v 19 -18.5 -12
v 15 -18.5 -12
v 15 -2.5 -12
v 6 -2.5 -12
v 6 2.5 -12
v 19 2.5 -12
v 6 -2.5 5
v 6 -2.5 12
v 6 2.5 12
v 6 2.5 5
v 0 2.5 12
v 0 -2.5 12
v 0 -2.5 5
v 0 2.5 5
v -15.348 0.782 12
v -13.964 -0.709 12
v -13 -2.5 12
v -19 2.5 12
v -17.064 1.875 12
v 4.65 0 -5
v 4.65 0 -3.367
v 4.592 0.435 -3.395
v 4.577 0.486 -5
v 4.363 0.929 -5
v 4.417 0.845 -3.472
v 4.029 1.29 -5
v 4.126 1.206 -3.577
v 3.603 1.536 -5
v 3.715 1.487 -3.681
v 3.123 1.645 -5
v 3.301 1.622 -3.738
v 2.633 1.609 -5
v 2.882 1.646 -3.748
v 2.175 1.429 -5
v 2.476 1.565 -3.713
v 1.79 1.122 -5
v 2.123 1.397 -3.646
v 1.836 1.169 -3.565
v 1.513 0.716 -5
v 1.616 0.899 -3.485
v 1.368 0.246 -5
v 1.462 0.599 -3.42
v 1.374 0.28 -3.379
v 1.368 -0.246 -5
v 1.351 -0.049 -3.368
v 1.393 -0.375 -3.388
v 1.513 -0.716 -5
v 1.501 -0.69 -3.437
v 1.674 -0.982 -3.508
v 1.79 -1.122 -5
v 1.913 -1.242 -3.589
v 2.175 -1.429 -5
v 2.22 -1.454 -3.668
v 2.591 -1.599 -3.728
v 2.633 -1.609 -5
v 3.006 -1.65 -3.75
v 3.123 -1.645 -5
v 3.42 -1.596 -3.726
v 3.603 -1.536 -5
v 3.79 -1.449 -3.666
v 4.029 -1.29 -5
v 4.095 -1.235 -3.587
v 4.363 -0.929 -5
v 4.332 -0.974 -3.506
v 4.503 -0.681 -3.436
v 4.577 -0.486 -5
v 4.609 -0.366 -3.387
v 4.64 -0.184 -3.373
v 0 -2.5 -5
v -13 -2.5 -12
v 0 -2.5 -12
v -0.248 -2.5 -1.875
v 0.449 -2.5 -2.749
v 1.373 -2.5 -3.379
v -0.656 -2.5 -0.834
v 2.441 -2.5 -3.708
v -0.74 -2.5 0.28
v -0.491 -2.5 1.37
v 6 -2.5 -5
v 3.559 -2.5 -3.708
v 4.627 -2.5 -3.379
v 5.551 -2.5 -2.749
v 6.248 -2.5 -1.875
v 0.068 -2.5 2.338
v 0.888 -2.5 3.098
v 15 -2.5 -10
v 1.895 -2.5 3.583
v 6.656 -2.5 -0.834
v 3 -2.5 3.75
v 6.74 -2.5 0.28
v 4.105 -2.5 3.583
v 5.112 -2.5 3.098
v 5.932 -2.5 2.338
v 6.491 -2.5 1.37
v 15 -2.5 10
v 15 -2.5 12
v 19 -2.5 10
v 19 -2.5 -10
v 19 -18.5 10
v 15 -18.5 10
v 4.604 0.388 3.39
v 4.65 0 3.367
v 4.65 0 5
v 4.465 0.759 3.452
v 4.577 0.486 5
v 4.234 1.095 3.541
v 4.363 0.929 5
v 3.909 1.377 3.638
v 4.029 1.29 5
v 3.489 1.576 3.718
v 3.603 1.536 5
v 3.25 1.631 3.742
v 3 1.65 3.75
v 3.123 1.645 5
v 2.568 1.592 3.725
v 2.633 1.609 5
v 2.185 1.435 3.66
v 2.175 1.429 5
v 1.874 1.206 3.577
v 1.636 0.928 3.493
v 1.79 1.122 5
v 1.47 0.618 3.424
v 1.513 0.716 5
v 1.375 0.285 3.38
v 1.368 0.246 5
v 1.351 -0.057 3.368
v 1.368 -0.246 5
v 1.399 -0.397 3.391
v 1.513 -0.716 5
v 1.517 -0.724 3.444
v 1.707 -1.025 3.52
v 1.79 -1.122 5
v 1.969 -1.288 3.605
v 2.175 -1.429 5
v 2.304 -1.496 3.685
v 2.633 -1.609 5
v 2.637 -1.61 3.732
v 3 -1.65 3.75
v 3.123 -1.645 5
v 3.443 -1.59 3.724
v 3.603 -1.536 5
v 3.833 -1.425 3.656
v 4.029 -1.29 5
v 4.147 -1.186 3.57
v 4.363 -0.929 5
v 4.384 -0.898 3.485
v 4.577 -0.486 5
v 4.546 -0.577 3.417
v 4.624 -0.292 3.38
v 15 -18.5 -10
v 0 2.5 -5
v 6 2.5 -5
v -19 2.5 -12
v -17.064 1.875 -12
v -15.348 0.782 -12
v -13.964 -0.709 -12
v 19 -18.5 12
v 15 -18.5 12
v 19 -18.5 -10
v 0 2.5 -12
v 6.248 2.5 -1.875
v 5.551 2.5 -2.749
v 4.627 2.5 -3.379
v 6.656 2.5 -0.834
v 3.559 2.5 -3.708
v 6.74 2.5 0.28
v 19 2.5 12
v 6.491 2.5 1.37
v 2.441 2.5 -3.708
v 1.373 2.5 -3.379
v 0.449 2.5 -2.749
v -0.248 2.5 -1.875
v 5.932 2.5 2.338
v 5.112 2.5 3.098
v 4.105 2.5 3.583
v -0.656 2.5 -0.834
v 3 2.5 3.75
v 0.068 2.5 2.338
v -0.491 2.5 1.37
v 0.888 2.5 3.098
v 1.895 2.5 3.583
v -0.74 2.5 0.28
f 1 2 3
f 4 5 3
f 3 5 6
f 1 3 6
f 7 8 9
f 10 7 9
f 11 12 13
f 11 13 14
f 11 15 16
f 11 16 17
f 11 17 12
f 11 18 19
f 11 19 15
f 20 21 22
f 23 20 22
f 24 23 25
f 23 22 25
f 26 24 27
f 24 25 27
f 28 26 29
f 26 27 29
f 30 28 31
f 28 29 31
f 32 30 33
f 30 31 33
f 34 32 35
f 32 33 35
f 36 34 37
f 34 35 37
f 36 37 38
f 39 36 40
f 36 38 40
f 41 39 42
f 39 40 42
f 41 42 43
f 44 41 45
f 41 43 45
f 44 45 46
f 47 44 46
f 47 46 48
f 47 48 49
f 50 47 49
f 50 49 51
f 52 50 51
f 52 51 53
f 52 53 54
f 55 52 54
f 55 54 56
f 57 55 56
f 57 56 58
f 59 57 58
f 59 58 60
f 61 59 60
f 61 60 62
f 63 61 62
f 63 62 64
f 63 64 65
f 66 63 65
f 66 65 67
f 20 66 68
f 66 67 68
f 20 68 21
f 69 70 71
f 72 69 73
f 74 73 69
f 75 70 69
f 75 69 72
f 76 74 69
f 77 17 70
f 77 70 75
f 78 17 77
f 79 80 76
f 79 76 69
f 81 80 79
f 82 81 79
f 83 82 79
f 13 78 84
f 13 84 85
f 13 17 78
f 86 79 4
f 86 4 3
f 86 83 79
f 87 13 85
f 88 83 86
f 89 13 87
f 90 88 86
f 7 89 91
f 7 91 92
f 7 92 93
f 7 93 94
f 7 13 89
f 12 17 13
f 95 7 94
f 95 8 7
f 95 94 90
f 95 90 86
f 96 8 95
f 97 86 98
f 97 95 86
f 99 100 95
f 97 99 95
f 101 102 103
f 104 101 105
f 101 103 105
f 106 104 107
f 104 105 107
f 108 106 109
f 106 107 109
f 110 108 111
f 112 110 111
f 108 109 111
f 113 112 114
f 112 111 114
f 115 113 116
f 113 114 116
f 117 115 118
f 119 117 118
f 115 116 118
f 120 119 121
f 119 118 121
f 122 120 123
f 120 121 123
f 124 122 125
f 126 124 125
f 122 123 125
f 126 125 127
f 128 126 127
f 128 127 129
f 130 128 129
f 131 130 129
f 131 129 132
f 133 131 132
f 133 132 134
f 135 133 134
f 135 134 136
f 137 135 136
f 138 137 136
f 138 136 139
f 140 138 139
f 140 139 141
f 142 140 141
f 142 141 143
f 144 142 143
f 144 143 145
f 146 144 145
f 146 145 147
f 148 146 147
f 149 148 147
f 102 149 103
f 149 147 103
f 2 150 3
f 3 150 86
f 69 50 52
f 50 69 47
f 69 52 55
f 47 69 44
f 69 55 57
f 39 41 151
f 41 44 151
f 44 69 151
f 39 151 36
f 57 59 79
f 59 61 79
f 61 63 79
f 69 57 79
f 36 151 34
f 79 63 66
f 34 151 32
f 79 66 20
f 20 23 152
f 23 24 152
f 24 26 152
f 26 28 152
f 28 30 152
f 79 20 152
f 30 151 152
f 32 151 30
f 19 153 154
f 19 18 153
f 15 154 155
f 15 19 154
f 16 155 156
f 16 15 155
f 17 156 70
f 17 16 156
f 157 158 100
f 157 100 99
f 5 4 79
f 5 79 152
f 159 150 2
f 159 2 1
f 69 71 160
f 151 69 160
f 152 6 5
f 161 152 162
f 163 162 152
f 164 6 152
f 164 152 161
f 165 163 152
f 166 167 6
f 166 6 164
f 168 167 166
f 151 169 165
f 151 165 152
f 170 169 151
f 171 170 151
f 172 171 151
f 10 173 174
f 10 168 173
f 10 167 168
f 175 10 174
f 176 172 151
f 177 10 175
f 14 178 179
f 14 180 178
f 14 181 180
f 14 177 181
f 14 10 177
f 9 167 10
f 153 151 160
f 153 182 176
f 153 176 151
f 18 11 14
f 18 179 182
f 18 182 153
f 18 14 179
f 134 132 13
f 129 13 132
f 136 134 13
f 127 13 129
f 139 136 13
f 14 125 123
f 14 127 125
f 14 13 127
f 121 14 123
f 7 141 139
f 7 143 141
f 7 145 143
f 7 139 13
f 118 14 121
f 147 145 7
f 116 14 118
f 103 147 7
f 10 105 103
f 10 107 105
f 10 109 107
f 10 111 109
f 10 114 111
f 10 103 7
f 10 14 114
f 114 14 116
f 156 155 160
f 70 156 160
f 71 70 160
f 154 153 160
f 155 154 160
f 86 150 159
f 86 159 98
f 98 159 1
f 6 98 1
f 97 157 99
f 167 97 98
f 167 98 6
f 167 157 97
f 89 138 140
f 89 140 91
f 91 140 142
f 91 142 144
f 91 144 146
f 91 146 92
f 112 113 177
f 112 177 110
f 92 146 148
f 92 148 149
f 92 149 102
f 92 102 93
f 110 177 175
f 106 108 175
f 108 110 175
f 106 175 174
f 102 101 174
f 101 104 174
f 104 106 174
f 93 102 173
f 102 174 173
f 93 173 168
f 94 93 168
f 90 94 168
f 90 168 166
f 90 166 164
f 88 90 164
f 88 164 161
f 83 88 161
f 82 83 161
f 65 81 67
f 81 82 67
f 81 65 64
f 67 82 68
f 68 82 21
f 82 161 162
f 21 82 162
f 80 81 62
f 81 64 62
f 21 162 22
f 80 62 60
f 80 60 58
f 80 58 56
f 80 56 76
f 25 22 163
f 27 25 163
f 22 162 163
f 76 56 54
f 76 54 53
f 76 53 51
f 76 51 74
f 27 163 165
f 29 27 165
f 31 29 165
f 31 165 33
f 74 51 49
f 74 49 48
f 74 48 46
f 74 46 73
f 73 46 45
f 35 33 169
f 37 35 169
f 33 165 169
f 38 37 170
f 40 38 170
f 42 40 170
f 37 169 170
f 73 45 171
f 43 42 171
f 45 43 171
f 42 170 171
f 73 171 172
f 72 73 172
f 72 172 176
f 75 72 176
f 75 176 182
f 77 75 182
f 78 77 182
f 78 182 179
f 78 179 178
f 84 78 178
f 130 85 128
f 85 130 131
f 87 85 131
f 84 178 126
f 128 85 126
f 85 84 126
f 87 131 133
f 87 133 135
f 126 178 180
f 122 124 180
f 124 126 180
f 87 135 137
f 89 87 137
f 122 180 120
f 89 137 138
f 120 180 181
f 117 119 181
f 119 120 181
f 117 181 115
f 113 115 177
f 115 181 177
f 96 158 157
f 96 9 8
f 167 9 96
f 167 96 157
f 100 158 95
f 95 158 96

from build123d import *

# Parameters (mm, degrees)
BOSS_EXTRUDE1_DEPTH = 12
CUT_EXTRUDE1_REACH  = 32.712
SKETCH4_R           = 1.65
SKETCH4_3_W         = 6
SKETCH4_3_H         = 5
SKETCH4_3_R         = 1.65
CUT_EXTRUDE3_DEPTH  = 7
CUT_EXTRUDE2_REACH  = 25.022
SKETCH5_R           = 3.75
SKETCH6_W           = 4
SKETCH6_H           = 16
BOSS_EXTRUDE2_DEPTH = 24
CUT_EXTRUDE4_REACH  = 42.525
SKETCH7_W           = 20
SKETCH7_H           = 16


with BuildPart() as part:
    # Sketch3 → Boss-Extrude1 (new, symmetric)
    with BuildSketch(Plane.XY):
        with BuildLine():
            Line((-13, -2.5), (19, -2.5))
            Line((19, -2.5), (19, 2.5))
            Line((19, 2.5), (-19, 2.5))
            ThreePointArc((-19, 2.5), (-15.348369117, 0.781957059), (-13, -2.5))
        make_face()
    extrude(amount=BOSS_EXTRUDE1_DEPTH, both=True)

    # Sketch4 → Cut-Extrude1 (cut, up to next)
    with BuildSketch(Plane.XY.offset(12), mode=Mode.PRIVATE) as cut_extrude1_sk1:
        with Locations((3, 0)):
            Circle(SKETCH4_R)
    cut_extrude1_tool1 = extrude(cut_extrude1_sk1.sketch, amount=-CUT_EXTRUDE1_REACH, mode=Mode.PRIVATE) & part.part
    add(cut_extrude1_tool1.solids().sort_by_distance((3, 0, 12))[0], mode=Mode.SUBTRACT)

    # Sketch4<3> → Cut-Extrude3 (cut)
    with BuildSketch(Plane.XY.offset(12)):
        with Locations((3, 0)):
            Rectangle(SKETCH4_3_W, SKETCH4_3_H)
        with Locations((3, 0)):
            Circle(SKETCH4_3_R, mode=Mode.SUBTRACT)
    cut_extrude3 = extrude(amount=-CUT_EXTRUDE3_DEPTH, mode=Mode.SUBTRACT)

    # Mirror1: Cut-Extrude3 across plane
    add(cut_extrude3.mirror(Plane.XY), mode=Mode.SUBTRACT)

    # Sketch5 → Cut-Extrude2 (cut, up to next)
    with BuildSketch(Plane(origin=(0, 2.5, 0), x_dir=(1, 0, 0), z_dir=(0, 1, 0)), mode=Mode.PRIVATE) as cut_extrude2_sk1:
        with Locations(Location((3, 0, 0), (0, 0, 270))):
            Circle(SKETCH5_R)
    cut_extrude2_tool1 = extrude(cut_extrude2_sk1.sketch, amount=-CUT_EXTRUDE2_REACH, mode=Mode.PRIVATE) & part.part
    add(cut_extrude2_tool1.solids().sort_by_distance((3, 2.5, 0))[0], mode=Mode.SUBTRACT)

    # Sketch6 → Boss-Extrude2 (add)
    with BuildSketch(Plane.XY.offset(12)):
        with Locations((17, -10.5)):
            Rectangle(SKETCH6_W, SKETCH6_H)
    extrude(amount=-BOSS_EXTRUDE2_DEPTH)

    # Sketch7 → Cut-Extrude4 (cut, up to next)
    with BuildSketch(Plane.ZY.offset(-15), mode=Mode.PRIVATE) as cut_extrude4_sk1:
        with Locations((0, -10.5)):
            Rectangle(SKETCH7_W, SKETCH7_H)
    cut_extrude4_tool1 = extrude(cut_extrude4_sk1.sketch, amount=-CUT_EXTRUDE4_REACH, mode=Mode.PRIVATE) & part.part
    add(cut_extrude4_tool1.solids().sort_by_distance((15, -10.5, 0))[0], mode=Mode.SUBTRACT)


solid = part.part
